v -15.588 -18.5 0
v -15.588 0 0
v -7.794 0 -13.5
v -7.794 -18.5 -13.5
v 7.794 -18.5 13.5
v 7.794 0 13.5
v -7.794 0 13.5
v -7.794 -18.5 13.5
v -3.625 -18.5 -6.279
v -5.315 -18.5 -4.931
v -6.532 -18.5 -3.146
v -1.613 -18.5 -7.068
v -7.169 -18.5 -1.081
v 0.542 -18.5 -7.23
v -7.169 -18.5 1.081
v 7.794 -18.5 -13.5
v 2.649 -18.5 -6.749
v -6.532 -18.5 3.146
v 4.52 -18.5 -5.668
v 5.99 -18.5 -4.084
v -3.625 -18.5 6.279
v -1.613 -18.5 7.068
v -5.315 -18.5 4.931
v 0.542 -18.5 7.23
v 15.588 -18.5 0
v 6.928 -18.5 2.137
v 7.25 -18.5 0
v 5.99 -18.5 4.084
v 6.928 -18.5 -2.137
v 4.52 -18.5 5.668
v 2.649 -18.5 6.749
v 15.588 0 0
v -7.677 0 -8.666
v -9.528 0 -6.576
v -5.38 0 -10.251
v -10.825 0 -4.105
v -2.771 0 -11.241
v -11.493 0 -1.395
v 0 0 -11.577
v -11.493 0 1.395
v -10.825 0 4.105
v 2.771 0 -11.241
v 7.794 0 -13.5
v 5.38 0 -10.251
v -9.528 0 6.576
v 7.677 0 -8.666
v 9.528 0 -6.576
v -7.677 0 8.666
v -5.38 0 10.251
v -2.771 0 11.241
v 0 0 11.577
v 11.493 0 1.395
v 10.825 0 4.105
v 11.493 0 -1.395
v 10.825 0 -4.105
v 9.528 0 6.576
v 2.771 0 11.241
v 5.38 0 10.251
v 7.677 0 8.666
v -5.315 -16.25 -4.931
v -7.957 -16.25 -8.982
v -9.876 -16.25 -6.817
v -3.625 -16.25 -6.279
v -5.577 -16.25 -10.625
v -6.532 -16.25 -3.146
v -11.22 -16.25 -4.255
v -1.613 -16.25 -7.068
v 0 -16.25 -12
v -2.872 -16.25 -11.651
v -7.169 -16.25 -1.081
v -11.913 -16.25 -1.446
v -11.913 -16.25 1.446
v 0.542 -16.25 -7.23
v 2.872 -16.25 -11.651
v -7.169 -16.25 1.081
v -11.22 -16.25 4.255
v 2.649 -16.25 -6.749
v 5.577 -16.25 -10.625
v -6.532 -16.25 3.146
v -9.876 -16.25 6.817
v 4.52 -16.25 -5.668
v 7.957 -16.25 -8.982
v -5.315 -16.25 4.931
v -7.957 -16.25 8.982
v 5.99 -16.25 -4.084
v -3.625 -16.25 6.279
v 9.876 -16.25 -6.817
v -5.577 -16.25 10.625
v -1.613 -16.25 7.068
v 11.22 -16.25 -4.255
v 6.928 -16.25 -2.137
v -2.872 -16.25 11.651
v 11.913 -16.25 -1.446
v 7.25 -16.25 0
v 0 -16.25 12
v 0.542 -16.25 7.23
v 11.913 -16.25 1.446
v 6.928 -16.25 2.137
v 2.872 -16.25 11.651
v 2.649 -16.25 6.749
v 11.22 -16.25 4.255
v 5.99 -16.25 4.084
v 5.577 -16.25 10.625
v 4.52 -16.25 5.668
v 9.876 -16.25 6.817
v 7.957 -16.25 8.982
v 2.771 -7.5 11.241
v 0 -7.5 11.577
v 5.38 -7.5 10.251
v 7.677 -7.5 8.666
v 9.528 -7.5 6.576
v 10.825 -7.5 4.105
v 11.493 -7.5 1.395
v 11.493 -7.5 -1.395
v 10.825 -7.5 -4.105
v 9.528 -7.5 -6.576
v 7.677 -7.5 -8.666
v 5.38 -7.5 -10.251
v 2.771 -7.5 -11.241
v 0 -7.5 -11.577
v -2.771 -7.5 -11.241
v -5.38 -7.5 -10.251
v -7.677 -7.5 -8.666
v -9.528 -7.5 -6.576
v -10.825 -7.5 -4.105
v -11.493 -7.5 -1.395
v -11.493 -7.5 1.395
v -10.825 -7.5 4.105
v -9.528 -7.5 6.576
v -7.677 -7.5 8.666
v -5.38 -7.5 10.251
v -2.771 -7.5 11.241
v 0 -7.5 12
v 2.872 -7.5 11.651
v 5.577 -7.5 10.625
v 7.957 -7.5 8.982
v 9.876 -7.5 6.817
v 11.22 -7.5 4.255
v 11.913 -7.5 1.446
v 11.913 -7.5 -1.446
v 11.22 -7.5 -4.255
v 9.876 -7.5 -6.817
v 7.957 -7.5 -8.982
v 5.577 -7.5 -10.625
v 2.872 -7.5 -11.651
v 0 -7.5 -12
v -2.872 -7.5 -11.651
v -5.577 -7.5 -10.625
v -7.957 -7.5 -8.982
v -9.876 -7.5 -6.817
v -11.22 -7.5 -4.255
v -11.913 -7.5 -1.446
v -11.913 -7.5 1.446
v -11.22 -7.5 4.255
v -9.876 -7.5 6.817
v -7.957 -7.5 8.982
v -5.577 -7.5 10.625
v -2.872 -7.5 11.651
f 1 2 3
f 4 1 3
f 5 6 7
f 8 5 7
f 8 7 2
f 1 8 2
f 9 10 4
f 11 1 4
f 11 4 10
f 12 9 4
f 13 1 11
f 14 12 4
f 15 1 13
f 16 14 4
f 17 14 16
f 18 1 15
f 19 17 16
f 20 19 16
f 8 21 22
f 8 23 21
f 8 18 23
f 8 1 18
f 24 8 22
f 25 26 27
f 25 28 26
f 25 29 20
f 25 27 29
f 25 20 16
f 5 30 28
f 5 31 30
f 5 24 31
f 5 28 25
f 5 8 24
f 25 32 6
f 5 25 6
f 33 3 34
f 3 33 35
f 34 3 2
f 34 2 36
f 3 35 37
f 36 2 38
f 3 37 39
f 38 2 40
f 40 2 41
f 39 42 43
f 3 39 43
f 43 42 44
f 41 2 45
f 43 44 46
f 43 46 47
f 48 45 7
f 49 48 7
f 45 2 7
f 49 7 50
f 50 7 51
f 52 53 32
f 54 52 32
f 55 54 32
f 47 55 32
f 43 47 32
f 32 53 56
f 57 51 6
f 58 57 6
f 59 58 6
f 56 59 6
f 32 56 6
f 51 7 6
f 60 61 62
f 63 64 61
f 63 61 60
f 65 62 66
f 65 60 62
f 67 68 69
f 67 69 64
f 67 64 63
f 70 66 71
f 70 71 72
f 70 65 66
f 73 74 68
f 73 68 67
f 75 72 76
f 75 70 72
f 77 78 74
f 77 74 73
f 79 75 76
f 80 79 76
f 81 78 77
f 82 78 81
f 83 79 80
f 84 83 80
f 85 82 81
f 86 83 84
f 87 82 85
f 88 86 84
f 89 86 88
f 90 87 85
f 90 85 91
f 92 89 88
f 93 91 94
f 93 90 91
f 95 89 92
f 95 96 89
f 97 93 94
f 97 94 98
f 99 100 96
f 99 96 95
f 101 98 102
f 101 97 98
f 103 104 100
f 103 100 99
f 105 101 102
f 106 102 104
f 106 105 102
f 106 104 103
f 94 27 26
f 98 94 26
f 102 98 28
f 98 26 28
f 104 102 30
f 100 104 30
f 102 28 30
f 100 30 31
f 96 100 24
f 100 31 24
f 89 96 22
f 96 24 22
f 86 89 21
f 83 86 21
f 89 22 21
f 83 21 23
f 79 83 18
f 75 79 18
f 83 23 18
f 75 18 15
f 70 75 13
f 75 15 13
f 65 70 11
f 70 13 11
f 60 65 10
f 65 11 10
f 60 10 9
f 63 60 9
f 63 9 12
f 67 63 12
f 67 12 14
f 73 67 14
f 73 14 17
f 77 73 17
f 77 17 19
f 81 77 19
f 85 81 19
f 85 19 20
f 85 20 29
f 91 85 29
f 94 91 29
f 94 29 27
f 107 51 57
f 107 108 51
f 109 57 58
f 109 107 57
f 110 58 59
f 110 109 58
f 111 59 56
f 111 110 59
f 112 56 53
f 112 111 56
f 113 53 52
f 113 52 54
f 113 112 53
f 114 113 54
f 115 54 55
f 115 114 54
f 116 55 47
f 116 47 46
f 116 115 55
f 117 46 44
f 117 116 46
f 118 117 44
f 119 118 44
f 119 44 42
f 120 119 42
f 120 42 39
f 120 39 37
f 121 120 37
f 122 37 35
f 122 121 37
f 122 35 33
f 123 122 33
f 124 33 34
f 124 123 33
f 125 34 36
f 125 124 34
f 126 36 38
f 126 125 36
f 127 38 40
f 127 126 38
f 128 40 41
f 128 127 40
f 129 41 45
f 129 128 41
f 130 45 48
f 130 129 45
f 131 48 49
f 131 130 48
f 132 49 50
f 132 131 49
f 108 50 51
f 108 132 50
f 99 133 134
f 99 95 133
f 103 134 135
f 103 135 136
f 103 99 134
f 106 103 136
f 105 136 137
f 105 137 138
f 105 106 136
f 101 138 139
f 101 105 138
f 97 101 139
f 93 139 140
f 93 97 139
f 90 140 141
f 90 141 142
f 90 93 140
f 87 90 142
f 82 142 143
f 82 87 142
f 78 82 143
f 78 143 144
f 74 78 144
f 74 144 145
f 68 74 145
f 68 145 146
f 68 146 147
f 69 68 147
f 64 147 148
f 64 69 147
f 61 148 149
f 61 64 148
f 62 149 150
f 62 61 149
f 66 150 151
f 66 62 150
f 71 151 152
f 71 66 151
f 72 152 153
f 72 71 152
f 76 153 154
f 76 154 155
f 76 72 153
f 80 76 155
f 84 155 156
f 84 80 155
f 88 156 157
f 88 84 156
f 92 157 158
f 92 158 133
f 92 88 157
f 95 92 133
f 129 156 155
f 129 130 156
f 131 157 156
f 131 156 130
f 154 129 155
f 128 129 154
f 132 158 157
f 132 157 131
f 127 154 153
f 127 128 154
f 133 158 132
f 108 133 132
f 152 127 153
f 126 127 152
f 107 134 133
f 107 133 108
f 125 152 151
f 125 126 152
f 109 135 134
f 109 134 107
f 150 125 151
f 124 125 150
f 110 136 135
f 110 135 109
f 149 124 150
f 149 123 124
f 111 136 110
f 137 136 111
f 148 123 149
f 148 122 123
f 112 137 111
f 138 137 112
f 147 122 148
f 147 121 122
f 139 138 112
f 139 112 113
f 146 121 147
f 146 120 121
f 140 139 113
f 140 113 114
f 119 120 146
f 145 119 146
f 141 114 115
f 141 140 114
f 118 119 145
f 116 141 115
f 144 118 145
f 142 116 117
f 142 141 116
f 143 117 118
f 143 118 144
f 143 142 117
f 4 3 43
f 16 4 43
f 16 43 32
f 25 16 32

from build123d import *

# Parameters (mm, degrees)
F1_DEPTH = 18.5
F2_R     = 7.25
F3_DEPTH = 18.501


with BuildPart() as f1:
    # F0 (on Front) → F1 (new body)
    with BuildSketch(Plane.XZ):
        Polygon((7.794229, 13.5), (-7.794229, 13.5), (-15.588457, 0), (-7.794229, -13.5), (7.794229, -13.5), (15.588457, 0), align=None)
    extrude(amount=F1_DEPTH)

    # F2 (on face) → F3 (cut, through all)
    with BuildSketch(Plane.XZ.offset(18.5)):
        Circle(F2_R)
    extrude(amount=-F3_DEPTH, mode=Mode.SUBTRACT)

    # F4 (on Right) → F5 (revolve, cut)
    with BuildSketch(Plane.YZ):
        Polygon((-16.25, 0), (0, 0), (0, 11.577), (-7.5, 11.577), (-7.5, 12), (-16.25, 12), align=None)
    revolve(axis=Axis((0, -8.125, 0), (0, 1, 0)), mode=Mode.SUBTRACT)


solid = f1.part
